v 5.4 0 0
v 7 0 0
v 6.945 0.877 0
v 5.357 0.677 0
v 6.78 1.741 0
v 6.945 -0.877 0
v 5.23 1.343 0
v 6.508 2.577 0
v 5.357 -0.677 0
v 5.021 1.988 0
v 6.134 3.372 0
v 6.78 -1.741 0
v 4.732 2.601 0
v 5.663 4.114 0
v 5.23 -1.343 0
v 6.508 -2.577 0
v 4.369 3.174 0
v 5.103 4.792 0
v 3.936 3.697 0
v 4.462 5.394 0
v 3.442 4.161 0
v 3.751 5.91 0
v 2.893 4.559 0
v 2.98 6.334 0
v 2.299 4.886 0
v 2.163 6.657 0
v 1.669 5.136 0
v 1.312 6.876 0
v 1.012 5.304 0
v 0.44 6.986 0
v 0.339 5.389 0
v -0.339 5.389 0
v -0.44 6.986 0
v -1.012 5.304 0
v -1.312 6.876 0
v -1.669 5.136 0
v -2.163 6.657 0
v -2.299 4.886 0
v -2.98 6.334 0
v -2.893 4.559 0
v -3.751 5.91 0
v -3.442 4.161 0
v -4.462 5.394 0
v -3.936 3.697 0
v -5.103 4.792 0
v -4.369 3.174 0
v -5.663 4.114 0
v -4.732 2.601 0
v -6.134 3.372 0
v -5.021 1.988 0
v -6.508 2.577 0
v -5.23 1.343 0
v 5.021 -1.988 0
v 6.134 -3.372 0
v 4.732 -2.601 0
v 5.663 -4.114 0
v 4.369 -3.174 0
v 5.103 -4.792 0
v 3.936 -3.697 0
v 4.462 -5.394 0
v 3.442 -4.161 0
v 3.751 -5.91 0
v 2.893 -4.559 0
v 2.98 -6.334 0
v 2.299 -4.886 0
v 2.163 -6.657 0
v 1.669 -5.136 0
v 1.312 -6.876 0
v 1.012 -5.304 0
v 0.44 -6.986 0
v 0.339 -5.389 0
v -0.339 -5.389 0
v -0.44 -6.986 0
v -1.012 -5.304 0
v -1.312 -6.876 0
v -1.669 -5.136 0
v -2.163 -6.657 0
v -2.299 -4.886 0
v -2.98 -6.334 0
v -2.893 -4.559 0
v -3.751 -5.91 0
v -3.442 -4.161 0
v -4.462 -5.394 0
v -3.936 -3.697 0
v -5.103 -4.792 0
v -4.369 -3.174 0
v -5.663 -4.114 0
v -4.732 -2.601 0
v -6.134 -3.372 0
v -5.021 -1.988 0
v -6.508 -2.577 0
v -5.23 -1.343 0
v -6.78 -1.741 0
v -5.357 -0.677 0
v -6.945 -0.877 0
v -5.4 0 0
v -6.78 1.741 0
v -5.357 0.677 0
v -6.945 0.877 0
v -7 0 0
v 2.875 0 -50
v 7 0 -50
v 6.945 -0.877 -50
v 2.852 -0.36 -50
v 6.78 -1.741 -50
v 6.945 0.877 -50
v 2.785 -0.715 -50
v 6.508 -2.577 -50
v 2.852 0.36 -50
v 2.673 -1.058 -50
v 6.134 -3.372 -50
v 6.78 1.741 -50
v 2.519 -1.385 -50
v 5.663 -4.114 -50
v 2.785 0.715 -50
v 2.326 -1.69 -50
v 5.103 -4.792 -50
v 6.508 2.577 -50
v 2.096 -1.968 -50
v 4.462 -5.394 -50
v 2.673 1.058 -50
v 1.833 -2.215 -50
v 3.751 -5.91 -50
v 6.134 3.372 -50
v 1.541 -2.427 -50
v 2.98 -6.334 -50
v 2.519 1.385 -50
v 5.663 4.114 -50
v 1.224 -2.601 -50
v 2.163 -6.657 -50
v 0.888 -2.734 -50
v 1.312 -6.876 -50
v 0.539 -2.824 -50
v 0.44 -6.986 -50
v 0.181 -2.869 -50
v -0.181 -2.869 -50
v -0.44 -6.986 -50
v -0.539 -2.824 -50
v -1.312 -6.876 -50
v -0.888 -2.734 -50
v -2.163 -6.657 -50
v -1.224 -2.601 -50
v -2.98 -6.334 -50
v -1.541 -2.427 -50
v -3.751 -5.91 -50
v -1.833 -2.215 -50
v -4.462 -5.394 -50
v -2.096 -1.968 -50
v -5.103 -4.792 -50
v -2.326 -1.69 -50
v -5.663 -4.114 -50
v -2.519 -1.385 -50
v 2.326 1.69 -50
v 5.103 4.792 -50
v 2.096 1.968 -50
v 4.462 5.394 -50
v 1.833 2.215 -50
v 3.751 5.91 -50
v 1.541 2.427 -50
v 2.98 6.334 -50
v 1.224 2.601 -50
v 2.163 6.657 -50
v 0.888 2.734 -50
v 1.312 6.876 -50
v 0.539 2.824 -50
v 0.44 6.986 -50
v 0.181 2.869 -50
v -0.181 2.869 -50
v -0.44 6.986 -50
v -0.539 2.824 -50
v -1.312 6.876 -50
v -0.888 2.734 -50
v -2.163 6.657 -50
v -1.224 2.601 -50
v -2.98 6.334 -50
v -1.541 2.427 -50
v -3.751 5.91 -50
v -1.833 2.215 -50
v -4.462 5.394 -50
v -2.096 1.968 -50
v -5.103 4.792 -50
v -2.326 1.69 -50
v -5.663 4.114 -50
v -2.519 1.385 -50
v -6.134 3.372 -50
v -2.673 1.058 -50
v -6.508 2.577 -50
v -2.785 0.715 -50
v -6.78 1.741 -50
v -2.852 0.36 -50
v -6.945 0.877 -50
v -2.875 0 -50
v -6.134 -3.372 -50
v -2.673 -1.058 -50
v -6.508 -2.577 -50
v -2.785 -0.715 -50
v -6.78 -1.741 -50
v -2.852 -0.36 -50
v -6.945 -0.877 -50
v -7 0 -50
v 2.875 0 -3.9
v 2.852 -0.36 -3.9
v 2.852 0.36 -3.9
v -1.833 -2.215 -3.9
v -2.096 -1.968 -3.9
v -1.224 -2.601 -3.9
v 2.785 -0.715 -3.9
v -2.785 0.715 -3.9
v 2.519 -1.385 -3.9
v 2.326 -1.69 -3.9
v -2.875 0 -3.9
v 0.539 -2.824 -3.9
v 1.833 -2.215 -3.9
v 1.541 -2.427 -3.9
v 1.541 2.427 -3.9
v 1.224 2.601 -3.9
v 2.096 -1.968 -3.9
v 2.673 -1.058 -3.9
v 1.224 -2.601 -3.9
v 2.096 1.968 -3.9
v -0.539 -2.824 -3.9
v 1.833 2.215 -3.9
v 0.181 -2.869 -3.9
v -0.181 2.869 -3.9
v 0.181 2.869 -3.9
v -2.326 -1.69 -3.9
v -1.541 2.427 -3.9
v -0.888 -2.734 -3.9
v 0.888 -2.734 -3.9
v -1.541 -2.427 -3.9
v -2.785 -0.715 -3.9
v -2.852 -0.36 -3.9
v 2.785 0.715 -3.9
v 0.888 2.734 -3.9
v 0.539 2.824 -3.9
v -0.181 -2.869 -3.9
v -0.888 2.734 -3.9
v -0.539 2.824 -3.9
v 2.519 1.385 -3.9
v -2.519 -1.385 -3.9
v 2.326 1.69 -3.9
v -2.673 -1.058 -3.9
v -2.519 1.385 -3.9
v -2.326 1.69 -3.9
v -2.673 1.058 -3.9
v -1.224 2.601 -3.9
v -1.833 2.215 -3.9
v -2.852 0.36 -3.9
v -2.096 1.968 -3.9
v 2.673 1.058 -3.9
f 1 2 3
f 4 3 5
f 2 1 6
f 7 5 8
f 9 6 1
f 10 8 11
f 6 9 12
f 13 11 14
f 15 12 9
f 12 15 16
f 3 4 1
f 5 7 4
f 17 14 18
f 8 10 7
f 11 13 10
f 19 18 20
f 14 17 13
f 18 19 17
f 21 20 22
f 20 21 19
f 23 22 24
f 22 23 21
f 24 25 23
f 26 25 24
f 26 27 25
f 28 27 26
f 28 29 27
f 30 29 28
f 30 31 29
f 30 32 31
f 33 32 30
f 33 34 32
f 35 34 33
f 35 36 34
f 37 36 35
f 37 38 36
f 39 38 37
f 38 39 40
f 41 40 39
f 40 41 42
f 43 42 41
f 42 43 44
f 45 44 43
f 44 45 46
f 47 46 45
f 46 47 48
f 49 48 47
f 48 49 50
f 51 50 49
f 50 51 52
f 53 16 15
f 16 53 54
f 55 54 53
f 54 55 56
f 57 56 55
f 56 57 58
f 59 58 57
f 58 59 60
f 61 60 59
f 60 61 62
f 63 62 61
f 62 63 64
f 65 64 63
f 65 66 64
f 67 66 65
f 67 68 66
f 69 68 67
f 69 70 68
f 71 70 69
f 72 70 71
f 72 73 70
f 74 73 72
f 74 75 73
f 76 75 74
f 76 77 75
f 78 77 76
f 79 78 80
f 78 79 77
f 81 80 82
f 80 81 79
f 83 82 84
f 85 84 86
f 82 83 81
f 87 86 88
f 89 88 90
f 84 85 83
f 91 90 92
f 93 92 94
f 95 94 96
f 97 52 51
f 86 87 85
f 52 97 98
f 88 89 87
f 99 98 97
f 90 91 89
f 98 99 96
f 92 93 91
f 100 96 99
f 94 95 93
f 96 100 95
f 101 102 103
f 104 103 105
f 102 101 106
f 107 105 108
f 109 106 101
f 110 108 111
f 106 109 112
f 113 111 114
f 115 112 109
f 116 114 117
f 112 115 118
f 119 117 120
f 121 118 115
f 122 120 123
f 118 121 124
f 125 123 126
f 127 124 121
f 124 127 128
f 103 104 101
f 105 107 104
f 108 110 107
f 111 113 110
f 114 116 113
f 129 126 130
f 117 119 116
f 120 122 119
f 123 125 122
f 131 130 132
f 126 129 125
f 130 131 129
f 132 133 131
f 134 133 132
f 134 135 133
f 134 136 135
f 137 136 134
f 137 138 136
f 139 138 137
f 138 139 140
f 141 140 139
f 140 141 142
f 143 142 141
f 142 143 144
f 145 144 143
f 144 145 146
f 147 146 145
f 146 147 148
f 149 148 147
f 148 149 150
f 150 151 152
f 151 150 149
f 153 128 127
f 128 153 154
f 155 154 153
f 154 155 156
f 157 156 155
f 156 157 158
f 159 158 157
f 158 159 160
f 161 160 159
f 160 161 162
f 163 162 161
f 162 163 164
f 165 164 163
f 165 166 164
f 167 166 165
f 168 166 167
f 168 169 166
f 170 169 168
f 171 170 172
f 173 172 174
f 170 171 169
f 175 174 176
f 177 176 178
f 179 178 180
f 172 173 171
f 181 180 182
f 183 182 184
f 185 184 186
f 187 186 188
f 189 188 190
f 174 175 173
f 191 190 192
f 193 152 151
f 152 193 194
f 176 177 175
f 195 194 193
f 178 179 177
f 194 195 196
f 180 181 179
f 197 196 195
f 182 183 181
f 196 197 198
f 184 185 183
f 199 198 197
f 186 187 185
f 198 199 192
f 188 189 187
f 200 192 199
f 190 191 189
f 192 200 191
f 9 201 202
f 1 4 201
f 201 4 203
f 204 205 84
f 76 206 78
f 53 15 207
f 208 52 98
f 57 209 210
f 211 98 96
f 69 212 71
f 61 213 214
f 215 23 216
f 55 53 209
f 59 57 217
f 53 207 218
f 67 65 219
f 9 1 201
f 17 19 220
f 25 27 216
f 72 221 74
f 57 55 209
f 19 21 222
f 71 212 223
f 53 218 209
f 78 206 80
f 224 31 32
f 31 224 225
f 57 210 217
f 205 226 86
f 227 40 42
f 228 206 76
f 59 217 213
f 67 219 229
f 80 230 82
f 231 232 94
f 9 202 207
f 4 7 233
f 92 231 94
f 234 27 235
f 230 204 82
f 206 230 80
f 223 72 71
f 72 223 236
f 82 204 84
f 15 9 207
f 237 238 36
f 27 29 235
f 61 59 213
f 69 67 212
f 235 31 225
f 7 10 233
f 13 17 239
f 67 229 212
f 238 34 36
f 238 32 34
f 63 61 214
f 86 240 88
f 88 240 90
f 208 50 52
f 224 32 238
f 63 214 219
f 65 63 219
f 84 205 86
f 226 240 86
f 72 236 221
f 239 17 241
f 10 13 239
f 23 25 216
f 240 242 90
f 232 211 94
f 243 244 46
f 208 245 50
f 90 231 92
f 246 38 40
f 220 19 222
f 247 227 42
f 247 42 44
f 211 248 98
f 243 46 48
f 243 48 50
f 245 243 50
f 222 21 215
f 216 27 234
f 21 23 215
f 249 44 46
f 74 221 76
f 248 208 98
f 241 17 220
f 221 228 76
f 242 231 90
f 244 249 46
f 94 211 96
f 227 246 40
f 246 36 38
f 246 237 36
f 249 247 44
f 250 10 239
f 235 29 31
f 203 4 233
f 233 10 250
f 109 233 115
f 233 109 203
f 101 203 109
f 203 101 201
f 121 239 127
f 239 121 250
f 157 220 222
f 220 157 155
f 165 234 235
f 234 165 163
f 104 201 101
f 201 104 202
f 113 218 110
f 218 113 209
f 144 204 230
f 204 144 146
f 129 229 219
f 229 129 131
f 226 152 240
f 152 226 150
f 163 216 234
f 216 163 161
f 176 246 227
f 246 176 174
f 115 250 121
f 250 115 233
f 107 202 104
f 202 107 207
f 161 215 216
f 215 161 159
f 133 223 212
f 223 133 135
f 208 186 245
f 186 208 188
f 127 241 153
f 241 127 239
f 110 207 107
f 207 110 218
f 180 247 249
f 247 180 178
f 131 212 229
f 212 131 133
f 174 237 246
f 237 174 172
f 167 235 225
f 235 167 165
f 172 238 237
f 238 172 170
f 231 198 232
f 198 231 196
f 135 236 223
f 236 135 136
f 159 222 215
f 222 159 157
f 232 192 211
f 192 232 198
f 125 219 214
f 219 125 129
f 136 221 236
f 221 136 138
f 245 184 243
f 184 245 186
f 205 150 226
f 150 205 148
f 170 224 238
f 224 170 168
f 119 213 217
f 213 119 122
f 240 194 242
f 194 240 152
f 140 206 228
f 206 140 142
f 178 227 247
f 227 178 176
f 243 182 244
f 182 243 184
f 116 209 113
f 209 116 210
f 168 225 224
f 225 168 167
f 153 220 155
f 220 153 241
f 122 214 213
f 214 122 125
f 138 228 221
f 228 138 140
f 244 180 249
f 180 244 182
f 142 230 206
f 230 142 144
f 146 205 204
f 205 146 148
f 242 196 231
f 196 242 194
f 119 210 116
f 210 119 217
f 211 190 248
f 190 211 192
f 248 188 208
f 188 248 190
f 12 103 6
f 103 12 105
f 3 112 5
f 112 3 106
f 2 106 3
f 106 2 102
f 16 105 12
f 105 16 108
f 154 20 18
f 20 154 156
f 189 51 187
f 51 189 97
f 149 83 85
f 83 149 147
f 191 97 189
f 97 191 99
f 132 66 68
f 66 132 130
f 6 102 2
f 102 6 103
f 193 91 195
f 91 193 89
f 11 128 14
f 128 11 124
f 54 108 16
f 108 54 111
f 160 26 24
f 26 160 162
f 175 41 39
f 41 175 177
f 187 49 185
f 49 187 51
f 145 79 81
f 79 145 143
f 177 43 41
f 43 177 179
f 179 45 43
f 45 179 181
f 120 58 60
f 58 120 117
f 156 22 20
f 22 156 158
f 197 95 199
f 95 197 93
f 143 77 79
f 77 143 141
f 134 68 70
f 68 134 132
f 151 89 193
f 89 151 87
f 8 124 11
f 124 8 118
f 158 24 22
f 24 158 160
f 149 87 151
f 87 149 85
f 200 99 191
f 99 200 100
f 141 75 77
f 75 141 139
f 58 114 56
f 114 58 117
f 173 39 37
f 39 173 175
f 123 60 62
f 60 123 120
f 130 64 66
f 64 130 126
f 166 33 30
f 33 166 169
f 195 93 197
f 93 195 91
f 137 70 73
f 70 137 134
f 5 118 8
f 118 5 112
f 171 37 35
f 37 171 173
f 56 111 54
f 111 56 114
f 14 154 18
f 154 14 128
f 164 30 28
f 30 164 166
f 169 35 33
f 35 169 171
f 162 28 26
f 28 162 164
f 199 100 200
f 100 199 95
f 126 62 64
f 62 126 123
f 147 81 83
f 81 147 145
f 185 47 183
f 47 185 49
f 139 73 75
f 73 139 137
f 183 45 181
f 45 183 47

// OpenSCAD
$fn = 50;


difference() {
	union() {
		translate(v = [0, 0, -50.0000000000]) {
			cylinder(h = 50, r = 7.0000000000);
		}
		cylinder(h = 0, r = 10.0000000000);
	}
	union() {
		translate(v = [0, 0, 0]) {
			rotate(a = [0, 0, 0]) {
				difference() {
					union() {
						#translate(v = [0, 0, -50.0000000000]) {
							cylinder(h = 50, r = 2.6000000000);
						}
						#translate(v = [0, 0, -3.9000000000]) {
							cylinder(h = 3.9000000000, r1 = 2.8750000000, r2 = 5.4000000000);
						}
						#translate(v = [0, 0, -50.0000000000]) {
							cylinder(h = 50, r = 2.8750000000);
						}
						#translate(v = [0, 0, -50.0000000000]) {
							cylinder(h = 50, r = 2.6000000000);
						}
					}
					union();
				}
			}
		}
	}
}
